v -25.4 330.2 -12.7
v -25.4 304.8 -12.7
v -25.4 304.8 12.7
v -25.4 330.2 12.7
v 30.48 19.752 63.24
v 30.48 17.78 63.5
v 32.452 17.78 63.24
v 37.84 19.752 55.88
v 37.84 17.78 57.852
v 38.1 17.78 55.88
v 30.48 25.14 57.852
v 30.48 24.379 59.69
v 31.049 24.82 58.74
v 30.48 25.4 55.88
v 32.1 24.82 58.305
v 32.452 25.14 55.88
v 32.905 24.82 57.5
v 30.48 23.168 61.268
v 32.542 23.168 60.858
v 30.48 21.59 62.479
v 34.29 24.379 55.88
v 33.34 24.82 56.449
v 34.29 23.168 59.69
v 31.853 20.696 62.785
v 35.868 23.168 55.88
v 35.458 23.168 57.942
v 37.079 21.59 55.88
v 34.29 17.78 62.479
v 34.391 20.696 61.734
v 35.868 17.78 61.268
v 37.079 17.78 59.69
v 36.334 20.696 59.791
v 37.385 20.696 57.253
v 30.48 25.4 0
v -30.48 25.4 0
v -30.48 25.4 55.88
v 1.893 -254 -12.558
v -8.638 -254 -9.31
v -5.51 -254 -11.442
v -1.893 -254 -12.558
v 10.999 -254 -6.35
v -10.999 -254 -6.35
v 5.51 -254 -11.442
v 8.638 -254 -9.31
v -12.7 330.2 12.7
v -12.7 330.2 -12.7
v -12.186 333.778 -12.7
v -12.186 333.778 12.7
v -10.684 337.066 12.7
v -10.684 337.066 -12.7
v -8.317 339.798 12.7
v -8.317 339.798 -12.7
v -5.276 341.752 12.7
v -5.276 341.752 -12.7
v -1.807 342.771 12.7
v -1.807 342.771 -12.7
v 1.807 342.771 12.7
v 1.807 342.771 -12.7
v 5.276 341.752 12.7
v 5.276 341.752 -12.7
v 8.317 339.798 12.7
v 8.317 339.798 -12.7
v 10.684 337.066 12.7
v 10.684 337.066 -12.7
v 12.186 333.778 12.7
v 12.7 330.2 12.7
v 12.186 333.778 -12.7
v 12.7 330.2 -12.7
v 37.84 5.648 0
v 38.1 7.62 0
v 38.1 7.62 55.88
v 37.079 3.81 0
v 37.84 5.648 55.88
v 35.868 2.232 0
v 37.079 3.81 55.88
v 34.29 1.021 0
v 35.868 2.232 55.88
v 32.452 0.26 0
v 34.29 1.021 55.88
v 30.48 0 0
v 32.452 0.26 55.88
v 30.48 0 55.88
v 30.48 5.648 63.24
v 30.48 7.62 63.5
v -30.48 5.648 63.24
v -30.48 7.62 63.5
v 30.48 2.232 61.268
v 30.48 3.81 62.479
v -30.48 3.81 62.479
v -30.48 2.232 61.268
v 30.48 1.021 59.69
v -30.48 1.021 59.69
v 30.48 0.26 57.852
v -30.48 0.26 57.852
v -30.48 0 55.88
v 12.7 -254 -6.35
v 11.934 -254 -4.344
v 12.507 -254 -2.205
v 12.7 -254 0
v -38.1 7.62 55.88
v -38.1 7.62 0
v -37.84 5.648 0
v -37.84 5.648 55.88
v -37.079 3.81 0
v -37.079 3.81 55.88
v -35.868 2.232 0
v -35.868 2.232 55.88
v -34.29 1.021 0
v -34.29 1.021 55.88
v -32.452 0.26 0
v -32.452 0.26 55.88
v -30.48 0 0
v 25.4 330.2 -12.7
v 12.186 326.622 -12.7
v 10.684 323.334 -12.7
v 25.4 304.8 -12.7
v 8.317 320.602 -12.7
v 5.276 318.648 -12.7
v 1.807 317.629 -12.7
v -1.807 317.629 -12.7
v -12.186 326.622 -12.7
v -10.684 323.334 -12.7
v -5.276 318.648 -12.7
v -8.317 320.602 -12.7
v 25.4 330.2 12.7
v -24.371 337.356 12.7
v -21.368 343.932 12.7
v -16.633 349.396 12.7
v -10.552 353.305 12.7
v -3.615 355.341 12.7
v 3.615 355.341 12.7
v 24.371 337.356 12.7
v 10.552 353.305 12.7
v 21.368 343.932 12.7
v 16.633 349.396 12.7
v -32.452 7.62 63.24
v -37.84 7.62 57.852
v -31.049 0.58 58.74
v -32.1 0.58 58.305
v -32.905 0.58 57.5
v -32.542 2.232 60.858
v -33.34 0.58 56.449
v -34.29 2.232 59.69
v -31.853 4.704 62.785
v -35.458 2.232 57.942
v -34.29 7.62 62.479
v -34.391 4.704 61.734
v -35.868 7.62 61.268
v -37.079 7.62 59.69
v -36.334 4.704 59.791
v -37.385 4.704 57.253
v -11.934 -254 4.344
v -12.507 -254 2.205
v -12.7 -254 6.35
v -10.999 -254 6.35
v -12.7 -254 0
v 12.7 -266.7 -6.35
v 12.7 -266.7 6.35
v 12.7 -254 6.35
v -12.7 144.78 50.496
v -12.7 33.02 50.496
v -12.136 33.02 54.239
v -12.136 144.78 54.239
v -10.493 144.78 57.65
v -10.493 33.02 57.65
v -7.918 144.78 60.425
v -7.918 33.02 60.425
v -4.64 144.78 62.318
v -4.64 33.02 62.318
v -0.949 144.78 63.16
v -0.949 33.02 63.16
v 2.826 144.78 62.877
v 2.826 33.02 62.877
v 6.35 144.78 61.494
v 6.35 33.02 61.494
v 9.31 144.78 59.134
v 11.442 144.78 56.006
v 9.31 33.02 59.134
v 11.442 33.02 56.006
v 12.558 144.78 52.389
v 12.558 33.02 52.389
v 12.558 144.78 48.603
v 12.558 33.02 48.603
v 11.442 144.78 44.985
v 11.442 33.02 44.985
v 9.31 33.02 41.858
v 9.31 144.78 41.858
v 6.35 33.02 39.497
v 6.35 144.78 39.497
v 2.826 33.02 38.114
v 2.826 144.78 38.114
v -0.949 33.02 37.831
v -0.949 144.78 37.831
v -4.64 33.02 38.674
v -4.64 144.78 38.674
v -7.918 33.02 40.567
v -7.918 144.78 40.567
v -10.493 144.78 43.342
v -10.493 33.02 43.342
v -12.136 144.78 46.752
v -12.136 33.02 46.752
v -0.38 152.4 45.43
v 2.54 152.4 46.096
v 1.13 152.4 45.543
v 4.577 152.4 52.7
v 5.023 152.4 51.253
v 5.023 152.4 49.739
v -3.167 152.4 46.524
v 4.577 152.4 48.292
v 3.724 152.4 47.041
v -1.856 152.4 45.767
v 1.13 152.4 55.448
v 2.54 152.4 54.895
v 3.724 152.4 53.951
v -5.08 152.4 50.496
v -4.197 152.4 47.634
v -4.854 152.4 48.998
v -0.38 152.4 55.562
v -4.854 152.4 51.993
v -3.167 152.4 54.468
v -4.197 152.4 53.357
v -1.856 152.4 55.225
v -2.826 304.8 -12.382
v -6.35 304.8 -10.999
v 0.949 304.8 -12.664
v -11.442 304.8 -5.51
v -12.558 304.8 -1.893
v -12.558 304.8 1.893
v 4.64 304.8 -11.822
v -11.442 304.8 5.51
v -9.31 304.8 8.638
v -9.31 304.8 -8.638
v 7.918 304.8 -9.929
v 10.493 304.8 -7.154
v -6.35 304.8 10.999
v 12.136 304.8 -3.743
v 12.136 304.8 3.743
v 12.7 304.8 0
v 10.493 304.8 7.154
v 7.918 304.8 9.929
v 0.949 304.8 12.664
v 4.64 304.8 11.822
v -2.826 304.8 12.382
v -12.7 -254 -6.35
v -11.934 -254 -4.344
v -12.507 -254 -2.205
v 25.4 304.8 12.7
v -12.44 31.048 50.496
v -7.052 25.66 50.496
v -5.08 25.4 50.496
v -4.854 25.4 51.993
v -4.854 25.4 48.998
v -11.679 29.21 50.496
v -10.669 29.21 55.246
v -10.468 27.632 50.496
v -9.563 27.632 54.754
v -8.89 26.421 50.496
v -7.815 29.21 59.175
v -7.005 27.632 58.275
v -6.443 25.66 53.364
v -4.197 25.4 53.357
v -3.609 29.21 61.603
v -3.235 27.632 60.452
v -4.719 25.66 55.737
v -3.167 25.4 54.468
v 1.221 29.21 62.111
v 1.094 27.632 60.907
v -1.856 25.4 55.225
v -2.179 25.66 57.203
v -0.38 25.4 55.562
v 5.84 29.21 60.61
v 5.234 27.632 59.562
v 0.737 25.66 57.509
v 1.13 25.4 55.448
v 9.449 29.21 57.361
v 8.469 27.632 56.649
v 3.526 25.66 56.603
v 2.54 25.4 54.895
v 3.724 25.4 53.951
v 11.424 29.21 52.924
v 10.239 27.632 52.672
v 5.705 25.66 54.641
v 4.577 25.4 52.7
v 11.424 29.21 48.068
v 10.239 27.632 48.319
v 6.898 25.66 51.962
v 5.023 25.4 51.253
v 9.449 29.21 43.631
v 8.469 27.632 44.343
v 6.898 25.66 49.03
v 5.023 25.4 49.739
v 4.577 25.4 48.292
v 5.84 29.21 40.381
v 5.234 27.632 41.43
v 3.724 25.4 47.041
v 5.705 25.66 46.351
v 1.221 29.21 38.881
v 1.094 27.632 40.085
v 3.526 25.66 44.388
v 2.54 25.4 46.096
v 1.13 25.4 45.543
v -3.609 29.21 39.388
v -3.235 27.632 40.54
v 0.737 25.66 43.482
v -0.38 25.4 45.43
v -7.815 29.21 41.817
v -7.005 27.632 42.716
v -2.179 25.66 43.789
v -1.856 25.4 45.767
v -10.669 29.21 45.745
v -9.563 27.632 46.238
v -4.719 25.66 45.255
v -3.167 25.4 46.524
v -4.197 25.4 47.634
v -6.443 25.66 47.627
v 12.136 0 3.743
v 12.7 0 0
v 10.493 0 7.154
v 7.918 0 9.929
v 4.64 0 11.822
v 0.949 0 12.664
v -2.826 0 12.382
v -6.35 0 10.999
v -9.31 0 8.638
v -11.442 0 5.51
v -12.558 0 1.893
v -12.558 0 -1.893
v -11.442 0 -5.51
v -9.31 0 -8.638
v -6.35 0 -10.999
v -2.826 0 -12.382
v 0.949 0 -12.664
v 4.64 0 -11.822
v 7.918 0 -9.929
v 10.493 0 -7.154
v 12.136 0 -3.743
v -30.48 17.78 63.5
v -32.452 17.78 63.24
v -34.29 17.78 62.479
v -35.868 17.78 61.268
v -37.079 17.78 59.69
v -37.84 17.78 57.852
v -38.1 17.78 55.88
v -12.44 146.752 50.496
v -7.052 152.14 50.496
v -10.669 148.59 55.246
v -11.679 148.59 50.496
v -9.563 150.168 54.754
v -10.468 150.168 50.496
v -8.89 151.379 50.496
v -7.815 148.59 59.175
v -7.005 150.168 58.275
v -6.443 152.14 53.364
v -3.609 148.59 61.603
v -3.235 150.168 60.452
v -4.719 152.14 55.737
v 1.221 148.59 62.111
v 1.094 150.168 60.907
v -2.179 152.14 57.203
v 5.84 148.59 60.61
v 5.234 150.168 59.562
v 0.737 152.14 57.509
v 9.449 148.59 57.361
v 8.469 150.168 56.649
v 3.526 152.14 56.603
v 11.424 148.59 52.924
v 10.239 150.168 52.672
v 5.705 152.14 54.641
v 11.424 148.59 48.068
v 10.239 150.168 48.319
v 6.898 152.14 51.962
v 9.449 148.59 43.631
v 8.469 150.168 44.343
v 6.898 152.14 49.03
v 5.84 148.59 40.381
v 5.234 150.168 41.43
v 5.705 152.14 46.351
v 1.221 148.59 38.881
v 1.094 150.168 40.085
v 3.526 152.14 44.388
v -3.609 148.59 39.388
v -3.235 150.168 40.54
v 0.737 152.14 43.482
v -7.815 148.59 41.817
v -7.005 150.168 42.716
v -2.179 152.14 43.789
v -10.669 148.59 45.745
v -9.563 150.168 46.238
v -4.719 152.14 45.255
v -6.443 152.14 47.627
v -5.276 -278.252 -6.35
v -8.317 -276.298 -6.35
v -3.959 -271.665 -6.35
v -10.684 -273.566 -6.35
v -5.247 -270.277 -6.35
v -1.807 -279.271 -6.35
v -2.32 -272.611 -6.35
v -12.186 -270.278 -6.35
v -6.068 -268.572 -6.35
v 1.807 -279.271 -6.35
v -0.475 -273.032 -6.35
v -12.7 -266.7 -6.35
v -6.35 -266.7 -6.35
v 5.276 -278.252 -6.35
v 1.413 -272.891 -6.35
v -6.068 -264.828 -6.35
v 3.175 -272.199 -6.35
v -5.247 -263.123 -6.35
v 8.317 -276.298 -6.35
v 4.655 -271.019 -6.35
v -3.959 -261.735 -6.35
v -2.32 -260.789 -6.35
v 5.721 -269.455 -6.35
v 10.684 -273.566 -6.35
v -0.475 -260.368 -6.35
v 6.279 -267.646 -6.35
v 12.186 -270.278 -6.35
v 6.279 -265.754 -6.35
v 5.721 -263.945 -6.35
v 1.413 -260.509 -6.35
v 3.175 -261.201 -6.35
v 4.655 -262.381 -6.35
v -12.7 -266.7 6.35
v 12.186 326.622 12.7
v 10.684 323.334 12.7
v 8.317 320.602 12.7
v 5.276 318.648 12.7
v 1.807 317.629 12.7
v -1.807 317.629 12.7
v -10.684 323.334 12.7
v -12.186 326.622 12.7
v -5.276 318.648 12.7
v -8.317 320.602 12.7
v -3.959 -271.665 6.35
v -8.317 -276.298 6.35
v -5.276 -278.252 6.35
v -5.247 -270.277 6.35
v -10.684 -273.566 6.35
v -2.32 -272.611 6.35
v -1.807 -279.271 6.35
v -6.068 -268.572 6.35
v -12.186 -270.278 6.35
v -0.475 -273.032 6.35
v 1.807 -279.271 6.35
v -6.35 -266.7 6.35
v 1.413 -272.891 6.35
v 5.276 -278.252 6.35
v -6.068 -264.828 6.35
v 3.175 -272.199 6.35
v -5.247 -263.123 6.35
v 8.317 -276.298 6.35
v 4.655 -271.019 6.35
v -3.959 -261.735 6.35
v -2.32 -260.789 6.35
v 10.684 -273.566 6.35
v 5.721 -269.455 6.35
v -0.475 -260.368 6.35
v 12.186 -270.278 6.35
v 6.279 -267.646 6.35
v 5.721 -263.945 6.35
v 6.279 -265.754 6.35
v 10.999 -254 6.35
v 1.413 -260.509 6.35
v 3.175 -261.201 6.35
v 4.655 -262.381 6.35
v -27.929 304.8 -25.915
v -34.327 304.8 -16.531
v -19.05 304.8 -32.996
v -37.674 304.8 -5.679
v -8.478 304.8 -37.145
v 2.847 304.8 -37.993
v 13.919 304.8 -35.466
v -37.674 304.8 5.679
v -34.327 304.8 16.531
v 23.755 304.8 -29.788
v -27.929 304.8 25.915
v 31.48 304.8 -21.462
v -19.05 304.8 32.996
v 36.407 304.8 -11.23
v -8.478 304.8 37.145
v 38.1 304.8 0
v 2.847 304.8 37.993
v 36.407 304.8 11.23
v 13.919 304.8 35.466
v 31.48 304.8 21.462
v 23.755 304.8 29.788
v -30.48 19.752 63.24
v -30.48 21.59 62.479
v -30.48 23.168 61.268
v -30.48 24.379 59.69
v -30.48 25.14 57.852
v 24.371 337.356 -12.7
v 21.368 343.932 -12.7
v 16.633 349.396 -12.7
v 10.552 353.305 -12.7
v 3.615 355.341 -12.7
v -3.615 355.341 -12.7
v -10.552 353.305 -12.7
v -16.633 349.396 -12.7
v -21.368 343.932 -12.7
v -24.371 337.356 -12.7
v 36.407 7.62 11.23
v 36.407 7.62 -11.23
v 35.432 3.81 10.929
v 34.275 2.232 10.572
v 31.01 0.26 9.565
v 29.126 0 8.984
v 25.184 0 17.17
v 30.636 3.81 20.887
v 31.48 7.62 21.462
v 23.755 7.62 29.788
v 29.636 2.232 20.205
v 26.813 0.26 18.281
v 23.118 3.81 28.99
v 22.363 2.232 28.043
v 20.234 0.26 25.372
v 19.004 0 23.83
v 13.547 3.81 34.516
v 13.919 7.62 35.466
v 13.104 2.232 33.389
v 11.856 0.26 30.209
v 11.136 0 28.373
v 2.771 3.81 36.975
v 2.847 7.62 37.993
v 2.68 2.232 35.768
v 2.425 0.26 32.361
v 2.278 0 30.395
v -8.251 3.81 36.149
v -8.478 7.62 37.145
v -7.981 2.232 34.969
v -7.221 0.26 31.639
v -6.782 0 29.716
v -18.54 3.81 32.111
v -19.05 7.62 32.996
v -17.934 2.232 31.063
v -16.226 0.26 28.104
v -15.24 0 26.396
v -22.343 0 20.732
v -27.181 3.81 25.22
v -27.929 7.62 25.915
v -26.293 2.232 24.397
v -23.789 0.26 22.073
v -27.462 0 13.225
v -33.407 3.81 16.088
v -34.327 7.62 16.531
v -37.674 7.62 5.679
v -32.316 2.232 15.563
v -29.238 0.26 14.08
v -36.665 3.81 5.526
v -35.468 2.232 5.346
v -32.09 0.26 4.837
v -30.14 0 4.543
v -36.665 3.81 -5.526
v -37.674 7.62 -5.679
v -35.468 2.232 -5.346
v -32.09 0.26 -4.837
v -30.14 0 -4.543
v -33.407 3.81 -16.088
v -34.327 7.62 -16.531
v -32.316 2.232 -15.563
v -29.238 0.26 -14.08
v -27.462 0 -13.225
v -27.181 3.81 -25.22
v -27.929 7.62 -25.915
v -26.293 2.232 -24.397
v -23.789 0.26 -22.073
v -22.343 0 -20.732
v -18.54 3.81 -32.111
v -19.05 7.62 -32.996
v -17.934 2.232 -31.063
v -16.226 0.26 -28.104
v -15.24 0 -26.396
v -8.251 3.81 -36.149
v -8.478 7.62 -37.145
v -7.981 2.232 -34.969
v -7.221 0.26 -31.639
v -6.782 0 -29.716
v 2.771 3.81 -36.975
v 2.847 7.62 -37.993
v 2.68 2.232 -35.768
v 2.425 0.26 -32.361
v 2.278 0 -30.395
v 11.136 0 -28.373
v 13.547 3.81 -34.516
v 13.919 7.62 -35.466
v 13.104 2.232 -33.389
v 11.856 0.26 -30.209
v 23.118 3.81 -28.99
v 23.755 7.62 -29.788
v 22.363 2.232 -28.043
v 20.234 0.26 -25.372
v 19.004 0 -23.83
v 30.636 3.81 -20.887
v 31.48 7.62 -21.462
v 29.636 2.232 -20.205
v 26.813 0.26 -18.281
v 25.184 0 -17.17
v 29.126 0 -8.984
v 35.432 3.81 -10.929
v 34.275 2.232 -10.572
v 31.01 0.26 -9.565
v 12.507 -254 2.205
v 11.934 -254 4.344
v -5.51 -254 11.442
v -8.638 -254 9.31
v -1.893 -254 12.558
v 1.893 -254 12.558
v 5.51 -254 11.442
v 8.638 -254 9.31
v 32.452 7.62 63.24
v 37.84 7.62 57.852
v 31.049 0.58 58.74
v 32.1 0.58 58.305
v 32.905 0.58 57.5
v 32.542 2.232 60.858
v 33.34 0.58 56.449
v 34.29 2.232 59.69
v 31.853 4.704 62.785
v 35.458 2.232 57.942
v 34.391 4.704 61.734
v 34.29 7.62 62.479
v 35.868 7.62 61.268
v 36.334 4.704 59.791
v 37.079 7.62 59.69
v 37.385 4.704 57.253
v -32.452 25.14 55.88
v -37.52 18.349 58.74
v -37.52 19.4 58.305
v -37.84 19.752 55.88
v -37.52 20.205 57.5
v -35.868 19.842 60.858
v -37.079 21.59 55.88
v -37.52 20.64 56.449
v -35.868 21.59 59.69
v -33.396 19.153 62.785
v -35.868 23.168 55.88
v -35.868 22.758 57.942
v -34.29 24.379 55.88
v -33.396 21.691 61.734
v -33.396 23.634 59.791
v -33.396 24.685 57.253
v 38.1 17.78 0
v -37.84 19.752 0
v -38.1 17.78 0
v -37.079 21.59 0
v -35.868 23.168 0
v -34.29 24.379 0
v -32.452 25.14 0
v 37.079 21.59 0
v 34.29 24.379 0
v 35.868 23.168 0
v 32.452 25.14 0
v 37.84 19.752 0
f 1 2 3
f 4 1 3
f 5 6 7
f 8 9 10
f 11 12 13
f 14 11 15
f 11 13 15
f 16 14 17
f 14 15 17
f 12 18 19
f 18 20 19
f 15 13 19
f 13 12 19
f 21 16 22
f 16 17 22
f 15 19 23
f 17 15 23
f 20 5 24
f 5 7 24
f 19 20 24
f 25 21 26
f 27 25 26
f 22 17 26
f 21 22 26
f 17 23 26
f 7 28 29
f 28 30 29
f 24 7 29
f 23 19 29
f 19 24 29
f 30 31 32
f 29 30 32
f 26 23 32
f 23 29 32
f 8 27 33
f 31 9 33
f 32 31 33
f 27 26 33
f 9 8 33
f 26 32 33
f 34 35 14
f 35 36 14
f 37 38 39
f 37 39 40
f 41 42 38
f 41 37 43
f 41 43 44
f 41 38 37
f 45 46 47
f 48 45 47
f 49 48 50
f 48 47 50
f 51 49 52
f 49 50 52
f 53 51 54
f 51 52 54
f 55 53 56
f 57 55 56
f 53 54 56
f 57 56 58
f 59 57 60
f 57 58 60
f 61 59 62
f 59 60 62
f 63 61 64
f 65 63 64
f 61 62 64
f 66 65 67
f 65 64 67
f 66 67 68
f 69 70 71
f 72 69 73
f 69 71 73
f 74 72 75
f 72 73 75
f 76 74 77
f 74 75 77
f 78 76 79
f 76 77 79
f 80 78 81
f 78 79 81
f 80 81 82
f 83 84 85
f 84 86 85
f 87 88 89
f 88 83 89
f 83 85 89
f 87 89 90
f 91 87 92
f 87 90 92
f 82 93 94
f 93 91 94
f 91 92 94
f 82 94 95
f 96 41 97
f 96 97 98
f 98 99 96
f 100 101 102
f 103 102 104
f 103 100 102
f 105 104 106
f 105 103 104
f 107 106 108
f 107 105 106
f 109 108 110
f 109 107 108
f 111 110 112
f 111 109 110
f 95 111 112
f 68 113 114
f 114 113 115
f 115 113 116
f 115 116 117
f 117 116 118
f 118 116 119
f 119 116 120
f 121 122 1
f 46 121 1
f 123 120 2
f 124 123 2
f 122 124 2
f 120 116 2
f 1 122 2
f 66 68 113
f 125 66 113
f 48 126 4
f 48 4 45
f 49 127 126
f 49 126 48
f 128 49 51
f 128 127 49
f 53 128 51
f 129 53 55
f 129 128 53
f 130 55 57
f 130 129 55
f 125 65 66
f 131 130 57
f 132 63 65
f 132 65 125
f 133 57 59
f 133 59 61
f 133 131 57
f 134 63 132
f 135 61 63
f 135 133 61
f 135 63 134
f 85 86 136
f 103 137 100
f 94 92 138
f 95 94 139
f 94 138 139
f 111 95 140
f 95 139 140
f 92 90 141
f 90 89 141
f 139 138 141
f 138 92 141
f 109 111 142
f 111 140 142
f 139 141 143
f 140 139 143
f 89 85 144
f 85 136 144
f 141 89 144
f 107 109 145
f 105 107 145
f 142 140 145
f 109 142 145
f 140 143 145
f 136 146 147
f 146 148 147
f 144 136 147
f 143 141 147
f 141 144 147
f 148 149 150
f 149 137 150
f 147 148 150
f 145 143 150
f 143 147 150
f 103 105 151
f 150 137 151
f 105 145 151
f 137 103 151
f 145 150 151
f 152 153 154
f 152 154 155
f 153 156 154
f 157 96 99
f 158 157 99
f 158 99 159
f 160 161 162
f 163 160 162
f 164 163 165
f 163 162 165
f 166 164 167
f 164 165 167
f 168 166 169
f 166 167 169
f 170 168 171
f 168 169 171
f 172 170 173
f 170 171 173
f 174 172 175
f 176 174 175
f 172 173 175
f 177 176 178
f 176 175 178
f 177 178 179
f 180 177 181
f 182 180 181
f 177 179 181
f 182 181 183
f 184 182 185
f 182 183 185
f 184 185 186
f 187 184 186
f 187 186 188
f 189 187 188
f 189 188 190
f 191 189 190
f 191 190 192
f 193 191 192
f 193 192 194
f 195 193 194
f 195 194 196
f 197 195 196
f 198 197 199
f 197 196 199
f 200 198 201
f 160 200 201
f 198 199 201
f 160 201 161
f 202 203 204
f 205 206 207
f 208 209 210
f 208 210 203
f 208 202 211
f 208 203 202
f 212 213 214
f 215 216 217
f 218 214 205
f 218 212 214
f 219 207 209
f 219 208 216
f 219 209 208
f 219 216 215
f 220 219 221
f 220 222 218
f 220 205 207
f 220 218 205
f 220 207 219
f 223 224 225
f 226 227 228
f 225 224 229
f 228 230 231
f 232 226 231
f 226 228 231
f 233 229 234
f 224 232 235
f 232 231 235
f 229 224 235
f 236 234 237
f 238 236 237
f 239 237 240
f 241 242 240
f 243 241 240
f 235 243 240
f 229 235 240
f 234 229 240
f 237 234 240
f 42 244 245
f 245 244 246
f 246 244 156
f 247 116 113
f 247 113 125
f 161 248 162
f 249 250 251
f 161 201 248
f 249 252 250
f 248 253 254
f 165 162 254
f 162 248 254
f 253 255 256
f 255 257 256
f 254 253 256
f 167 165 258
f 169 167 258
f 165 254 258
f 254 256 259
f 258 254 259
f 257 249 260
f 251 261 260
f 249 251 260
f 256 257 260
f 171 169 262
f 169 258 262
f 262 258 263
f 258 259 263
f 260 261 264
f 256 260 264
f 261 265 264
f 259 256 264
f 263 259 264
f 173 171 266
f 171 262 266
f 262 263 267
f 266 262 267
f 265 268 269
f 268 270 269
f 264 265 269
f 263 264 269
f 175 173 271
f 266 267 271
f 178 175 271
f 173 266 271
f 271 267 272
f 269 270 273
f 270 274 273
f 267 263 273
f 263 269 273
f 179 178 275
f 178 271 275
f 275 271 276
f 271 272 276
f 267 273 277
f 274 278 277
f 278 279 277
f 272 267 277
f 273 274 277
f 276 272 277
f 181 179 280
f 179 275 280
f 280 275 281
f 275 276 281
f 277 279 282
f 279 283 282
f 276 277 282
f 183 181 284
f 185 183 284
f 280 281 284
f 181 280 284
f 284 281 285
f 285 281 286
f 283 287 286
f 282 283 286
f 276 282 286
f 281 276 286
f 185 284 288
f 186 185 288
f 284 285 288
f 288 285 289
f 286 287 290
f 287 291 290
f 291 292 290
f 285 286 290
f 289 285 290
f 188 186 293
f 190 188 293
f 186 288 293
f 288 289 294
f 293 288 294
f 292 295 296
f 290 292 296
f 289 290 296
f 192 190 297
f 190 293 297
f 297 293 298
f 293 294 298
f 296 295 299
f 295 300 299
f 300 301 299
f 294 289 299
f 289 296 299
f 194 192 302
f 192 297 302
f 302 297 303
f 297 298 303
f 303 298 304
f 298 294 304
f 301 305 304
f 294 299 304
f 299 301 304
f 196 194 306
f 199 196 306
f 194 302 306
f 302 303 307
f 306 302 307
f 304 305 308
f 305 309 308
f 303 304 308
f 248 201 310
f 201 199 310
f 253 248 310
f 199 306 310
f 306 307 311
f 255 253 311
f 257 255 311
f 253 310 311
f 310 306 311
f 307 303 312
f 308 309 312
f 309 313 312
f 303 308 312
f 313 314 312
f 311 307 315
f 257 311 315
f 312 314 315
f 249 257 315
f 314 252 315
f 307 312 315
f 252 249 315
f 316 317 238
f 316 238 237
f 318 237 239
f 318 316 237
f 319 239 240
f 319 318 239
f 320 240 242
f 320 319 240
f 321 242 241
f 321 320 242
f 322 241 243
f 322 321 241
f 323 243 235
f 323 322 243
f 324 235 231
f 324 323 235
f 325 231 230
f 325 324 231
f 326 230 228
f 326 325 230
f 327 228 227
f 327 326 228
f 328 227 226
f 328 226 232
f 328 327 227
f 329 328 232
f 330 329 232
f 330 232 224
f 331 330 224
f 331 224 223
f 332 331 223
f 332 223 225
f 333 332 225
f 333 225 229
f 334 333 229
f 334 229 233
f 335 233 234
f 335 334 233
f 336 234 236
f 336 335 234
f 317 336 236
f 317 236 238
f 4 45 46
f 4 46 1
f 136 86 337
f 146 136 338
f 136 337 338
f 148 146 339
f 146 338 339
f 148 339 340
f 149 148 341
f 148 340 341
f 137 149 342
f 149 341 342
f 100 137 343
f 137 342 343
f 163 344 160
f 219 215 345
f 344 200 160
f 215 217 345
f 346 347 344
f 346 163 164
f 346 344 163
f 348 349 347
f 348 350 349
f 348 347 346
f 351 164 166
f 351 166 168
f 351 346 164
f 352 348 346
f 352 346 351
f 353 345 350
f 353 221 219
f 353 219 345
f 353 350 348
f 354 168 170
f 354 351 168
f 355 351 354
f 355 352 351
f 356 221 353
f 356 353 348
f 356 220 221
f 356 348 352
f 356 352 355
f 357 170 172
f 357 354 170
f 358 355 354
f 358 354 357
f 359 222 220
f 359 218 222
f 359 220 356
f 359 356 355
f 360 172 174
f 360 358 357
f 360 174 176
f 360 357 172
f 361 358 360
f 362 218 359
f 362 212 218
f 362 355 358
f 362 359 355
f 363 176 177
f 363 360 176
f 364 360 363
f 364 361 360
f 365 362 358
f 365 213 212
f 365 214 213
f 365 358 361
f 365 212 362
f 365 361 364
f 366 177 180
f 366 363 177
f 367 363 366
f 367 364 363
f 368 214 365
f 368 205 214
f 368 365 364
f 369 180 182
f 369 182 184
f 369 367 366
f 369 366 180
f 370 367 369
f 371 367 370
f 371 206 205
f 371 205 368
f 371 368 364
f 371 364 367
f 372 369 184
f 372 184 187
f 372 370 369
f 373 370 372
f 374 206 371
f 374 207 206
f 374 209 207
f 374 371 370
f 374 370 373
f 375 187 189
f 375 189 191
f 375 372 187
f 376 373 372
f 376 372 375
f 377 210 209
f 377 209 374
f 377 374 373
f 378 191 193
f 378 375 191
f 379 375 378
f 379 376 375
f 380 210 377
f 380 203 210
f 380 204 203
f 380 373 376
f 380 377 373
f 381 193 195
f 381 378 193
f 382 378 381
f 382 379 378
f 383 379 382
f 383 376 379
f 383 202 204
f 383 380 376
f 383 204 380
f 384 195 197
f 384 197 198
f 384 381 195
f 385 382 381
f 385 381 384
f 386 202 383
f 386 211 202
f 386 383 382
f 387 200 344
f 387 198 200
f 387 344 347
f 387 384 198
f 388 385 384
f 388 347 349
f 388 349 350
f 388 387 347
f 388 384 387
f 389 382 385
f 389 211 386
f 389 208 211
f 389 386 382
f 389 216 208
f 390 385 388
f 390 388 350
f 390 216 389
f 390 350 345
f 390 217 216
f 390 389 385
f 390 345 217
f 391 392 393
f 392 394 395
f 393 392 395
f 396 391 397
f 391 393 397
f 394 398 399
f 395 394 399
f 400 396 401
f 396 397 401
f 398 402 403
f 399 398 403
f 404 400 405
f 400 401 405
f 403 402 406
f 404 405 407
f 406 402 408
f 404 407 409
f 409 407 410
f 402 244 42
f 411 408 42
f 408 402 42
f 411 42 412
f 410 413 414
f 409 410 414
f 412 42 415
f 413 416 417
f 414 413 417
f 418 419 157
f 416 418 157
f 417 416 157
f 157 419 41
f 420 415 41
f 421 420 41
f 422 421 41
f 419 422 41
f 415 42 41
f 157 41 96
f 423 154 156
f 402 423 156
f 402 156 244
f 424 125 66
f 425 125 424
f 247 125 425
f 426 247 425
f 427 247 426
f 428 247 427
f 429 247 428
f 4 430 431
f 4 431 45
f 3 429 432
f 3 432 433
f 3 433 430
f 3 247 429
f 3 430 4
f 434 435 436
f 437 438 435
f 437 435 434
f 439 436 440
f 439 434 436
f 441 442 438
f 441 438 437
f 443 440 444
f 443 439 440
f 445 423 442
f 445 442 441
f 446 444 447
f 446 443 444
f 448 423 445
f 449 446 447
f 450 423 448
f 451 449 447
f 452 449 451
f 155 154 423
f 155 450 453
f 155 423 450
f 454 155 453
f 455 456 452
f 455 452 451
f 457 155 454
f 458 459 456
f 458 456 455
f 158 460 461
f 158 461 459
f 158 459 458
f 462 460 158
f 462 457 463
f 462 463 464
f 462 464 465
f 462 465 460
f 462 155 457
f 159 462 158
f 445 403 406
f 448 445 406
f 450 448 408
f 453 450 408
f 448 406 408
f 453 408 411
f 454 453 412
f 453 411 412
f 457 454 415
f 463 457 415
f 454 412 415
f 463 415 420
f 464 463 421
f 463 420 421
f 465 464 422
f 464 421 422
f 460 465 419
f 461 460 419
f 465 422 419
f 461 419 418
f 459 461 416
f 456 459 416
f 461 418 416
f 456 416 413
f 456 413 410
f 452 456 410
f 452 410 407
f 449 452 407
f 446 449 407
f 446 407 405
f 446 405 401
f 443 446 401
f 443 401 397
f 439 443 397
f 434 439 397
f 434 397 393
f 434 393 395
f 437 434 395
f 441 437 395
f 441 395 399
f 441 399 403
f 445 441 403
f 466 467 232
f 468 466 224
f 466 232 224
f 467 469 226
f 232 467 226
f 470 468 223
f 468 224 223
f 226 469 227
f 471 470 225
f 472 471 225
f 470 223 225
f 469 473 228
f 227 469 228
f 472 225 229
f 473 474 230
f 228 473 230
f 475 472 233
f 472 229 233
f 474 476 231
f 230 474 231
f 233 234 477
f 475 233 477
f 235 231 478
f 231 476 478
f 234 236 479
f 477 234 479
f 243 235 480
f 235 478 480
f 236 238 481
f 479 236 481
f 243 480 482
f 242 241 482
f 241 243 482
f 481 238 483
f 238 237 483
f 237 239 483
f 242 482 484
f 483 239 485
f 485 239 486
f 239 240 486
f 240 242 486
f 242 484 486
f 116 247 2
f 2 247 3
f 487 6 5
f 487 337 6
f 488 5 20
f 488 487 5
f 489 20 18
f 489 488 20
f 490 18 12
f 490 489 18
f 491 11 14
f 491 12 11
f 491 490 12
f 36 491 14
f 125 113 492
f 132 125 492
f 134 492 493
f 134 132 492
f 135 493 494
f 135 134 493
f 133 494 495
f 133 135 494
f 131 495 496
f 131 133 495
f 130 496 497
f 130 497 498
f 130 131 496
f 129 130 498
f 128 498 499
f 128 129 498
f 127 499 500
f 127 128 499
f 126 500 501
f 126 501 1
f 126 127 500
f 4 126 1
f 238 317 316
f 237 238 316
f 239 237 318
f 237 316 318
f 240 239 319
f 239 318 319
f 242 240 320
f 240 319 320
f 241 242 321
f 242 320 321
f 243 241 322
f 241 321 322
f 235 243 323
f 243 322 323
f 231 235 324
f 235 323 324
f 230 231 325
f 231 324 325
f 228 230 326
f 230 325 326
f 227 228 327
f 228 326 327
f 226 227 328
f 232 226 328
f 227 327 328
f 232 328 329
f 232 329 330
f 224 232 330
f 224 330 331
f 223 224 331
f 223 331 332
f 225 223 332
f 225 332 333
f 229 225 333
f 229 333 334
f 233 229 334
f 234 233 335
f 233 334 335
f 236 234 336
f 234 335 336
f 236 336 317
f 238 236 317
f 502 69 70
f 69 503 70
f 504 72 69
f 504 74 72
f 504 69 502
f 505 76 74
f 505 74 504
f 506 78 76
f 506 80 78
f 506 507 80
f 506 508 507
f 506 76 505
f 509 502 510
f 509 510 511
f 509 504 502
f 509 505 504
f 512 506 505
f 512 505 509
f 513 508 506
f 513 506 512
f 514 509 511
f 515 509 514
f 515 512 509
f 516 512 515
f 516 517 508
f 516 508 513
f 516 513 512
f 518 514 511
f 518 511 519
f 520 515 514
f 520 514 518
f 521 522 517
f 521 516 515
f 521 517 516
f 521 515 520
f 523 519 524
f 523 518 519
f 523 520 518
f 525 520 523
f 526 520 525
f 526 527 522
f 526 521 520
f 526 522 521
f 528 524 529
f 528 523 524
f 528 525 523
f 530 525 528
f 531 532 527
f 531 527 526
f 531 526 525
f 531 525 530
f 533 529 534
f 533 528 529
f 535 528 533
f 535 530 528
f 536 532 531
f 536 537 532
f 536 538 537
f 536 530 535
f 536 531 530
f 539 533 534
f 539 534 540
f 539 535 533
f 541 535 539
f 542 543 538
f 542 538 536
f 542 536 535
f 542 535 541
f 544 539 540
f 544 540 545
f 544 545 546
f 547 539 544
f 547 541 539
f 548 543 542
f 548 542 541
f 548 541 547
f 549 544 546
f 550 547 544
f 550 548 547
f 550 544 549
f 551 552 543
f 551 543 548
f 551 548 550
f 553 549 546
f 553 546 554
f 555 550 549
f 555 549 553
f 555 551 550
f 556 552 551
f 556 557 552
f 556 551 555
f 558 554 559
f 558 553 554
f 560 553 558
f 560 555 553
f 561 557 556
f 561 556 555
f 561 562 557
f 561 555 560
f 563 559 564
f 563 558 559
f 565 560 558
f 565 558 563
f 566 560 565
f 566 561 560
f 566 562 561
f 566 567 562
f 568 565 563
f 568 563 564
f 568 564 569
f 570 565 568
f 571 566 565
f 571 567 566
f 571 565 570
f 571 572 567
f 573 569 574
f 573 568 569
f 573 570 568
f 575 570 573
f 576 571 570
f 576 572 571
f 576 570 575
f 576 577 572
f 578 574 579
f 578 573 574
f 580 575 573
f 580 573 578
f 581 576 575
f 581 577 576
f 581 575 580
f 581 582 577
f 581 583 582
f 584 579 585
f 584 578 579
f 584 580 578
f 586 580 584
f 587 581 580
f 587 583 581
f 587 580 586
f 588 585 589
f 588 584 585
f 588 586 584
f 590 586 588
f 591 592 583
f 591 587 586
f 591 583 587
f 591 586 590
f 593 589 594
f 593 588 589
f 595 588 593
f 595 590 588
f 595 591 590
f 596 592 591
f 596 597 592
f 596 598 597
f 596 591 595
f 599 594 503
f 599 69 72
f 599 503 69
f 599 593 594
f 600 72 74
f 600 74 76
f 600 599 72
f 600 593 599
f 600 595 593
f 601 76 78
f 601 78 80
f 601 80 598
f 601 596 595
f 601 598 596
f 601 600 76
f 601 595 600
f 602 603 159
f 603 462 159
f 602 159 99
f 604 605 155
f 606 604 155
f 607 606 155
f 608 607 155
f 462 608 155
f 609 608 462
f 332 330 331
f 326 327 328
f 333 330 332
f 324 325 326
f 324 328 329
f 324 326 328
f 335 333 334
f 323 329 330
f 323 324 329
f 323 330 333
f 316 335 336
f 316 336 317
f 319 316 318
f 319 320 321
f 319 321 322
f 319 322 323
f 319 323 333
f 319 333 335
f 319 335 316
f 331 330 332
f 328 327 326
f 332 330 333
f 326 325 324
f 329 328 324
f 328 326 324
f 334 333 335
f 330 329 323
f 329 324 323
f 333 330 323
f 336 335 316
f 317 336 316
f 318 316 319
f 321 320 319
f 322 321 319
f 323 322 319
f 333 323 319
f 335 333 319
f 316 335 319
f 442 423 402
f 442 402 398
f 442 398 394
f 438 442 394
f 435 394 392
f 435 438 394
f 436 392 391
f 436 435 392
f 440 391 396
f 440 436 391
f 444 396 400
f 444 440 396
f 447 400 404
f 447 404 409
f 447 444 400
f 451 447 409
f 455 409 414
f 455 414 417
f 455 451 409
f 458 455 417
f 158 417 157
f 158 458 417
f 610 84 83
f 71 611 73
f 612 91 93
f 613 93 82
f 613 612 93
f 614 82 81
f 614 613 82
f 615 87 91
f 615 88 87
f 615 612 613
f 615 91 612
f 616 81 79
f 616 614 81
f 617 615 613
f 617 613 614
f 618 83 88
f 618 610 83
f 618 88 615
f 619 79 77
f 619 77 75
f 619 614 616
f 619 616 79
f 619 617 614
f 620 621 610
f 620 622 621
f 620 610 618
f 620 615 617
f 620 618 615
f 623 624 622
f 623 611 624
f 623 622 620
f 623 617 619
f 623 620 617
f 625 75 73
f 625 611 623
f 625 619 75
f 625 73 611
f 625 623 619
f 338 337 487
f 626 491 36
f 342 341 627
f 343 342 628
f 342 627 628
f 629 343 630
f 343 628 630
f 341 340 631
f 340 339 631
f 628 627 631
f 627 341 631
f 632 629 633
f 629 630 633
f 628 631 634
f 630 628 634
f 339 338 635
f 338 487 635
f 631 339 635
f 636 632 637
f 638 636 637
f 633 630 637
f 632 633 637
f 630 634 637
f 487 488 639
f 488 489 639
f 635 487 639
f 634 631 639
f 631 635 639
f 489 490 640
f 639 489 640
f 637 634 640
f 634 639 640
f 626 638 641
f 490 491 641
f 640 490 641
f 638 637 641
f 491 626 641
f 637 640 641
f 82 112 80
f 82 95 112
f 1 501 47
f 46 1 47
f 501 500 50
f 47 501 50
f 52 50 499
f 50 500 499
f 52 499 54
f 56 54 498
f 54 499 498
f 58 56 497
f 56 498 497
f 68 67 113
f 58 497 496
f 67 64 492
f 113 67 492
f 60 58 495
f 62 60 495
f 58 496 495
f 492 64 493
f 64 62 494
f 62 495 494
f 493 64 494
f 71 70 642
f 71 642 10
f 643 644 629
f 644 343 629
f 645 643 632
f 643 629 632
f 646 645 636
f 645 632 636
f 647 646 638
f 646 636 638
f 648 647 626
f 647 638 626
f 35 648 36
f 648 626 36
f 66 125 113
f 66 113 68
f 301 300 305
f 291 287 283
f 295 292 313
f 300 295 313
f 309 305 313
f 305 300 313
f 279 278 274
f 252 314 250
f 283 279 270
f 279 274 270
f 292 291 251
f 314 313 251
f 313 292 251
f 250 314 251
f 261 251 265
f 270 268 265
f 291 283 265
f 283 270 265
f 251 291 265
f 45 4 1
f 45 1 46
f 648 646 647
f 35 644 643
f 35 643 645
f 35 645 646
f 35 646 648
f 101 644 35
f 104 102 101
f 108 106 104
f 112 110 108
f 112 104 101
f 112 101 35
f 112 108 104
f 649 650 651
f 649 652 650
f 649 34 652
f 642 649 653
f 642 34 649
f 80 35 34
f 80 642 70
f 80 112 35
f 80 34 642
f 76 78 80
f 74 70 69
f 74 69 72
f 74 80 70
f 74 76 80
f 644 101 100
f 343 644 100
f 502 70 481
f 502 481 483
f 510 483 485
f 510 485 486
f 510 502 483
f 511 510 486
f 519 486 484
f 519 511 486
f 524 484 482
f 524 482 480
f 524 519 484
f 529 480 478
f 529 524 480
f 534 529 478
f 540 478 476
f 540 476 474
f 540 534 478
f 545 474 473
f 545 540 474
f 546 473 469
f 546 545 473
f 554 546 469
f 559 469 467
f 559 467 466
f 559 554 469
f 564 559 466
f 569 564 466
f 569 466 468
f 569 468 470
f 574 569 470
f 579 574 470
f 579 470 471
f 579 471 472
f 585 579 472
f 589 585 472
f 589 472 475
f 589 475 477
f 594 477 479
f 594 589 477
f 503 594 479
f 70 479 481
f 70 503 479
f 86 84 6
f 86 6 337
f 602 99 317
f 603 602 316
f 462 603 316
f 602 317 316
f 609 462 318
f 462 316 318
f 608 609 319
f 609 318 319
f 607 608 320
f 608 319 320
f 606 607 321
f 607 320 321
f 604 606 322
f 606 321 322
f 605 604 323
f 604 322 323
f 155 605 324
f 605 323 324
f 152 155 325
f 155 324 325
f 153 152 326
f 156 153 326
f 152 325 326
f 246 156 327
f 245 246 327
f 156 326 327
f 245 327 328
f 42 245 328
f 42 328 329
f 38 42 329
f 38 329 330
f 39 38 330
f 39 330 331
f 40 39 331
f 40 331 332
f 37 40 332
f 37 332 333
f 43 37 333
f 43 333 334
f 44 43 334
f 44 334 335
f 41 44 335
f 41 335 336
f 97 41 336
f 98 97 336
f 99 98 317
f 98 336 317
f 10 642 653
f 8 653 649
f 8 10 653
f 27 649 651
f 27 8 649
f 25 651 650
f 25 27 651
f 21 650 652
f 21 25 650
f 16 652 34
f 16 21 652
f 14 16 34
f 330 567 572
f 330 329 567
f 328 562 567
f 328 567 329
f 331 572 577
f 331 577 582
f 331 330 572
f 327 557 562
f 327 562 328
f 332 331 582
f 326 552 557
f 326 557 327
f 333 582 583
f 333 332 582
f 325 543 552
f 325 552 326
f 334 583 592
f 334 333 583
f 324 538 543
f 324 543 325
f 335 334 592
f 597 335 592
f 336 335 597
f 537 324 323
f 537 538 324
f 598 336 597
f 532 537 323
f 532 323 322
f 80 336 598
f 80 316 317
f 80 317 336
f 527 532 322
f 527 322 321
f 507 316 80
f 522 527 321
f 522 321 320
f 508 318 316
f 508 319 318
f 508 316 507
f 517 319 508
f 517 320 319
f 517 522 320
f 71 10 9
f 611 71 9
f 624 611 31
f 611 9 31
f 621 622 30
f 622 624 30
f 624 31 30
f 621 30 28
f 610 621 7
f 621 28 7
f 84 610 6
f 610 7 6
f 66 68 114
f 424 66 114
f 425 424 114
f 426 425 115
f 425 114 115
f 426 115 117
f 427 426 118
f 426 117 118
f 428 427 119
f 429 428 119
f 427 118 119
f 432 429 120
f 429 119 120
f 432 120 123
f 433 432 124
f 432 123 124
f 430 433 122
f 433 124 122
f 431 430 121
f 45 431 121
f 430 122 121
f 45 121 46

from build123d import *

# Parameters (mm, degrees)
F0_R      = 12.7
F1_DEPTH  = 254
F0_R_2    = 38.1
F2_DEPTH  = 304.8
F3_W      = 38.1
F3_H      = 63.5
F4_DEPTH  = 25.4
F5_R      = 12.7
F6_DEPTH  = 127
F7_DEPTH  = 304.8
F8_W      = 50.8
F8_H      = 25.4
F9_DEPTH  = 25.4
F11_DEPTH = 25.4
F13_D     = 25.4
F13_2_D   = 25.4
F14_R     = 7.62
F14_2_R   = 7.62
F14_3_R   = 7.62
F15_W     = 25.4
F15_H     = 6.3500005325
F16_DEPTH = 12.7
F18_DEPTH = 12.7
F20_D     = 12.7


# Not quite as in the source:
# - ends of sketch curves that miss each other by under 0.0002 mm in the source are joined


with BuildPart() as f1:
    # F0 (on Front) → F1 (new body)
    with BuildSketch(Plane.XZ):
        Circle(F0_R)
    extrude(amount=F1_DEPTH)


with BuildPart() as f2:
    # F0 (on Front) → F2 (new body)
    with BuildSketch(Plane.XZ):
        Circle(F0_R_2)
        Circle(F0_R, mode=Mode.SUBTRACT)
    extrude(amount=-F2_DEPTH)

    # F14#3
    f14_3_edges = [f2.edges().sort_by_distance(p)[0] for p in [
        (-38.1, 0, 0),
    ]]
    fillet(f14_3_edges, radius=F14_3_R)


with BuildPart() as f4:
    # F3 (on Front) → F4 (new body)
    with BuildSketch(Plane.XZ):
        with Locations((19.05, 31.75)):
            Rectangle(F3_W, F3_H)
        with Locations((-19.05, 31.75)):
            Rectangle(F3_W, F3_H)
    extrude(amount=-F4_DEPTH)

    # F14
    f14_edges = [f4.edges().sort_by_distance(p)[0] for p in [
        (38.1, 12.7, 63.5),
        (0, 25.4, 63.5),
        (-38.1, 12.7, 63.5),
        (0, 0, 63.5),
        (38.1, 25.4, 31.75),
        (38.1, 0, 31.75),
        (-38.1, 25.4, 31.75),
        (-38.1, 0, 31.75),
    ]]
    fillet(f14_edges, radius=F14_R)


with BuildPart() as f6:
    # F5 (on face) → F6 (new body)
    with BuildSketch(Plane(origin=(0, 25.4, 0), x_dir=(-1, 0, 0), z_dir=(0, 1, 0))):
        with Locations((0, 50.4958219826)):
            Circle(F5_R)
    extrude(amount=F6_DEPTH)

    # F14#2
    f14_2_edges = [f6.edges().sort_by_distance(p)[0] for p in [
        (12.7, 25.4, 50.495822),
        (12.7, 152.4, 50.495822),
    ]]
    fillet(f14_2_edges, radius=F14_2_R)


with BuildPart() as f7:
    # F7 (new): a face of the model
    f7_faces = [f1.part.faces().sort_by_distance(p)[0] for p in [
        (0, 0, 0),
    ]]
    extrude(f7_faces, amount=F7_DEPTH)


with BuildPart() as f9:
    # F8 (on face) → F9 (new body)
    with BuildSketch(Plane(origin=(0, 304.8, 0), x_dir=(-1, 0, 0), z_dir=(0, 1, 0))):
        Rectangle(F8_W, F8_H)
    extrude(amount=F9_DEPTH)

    # F13 (through all)
    with Locations(Plane.XY.offset(12.7)):
        with Locations((0, 330.2)):
            Hole(F13_D / 2)


with BuildPart() as f11:
    # F10 (on face) → F11 (new body)
    with BuildSketch(Plane.XY.offset(12.7)):
        with BuildLine():
            Line((-25.4, 330.2), (25.4, 330.2))
            ThreePointArc((25.4, 330.2), (0, 355.6), (-25.4, 330.2))
        make_face()
    extrude(amount=-F11_DEPTH)

    # F13#2 (through all)
    with Locations(Plane.XY.offset(12.7)):
        with Locations((0, 330.2)):
            Hole(F13_2_D / 2)


with BuildPart() as f1_1:
    add(f1.part)

    # F15 (on face) → F16 (join)
    with BuildSketch(Plane.XZ.offset(254)):
        Polygon((12.7, -6.35), (12.7, 0), (-12.7, -5.325e-07), (-12.7, -6.35), align=None)
        with Locations((0, 3.1749997337)):
            Rectangle(F15_W, F15_H)
    extrude(amount=F16_DEPTH)

    # F17 (on face) → F18 (join)
    with BuildSketch(Plane.XY.offset(6.35)):
        with BuildLine():
            Line((12.7, -266.7), (-12.7, -266.7))
            ThreePointArc((-12.7, -266.7), (0, -279.4), (12.7, -266.7))
        make_face()
    extrude(amount=-F18_DEPTH)

    # F20 (through all)
    with Locations(Plane.XY.offset(6.35)):
        with Locations((0, -266.7)):
            Hole(F20_D / 2)


solid = Compound([f2.part, f4.part, f6.part, f7.part, f9.part, f11.part, f1_1.part])
